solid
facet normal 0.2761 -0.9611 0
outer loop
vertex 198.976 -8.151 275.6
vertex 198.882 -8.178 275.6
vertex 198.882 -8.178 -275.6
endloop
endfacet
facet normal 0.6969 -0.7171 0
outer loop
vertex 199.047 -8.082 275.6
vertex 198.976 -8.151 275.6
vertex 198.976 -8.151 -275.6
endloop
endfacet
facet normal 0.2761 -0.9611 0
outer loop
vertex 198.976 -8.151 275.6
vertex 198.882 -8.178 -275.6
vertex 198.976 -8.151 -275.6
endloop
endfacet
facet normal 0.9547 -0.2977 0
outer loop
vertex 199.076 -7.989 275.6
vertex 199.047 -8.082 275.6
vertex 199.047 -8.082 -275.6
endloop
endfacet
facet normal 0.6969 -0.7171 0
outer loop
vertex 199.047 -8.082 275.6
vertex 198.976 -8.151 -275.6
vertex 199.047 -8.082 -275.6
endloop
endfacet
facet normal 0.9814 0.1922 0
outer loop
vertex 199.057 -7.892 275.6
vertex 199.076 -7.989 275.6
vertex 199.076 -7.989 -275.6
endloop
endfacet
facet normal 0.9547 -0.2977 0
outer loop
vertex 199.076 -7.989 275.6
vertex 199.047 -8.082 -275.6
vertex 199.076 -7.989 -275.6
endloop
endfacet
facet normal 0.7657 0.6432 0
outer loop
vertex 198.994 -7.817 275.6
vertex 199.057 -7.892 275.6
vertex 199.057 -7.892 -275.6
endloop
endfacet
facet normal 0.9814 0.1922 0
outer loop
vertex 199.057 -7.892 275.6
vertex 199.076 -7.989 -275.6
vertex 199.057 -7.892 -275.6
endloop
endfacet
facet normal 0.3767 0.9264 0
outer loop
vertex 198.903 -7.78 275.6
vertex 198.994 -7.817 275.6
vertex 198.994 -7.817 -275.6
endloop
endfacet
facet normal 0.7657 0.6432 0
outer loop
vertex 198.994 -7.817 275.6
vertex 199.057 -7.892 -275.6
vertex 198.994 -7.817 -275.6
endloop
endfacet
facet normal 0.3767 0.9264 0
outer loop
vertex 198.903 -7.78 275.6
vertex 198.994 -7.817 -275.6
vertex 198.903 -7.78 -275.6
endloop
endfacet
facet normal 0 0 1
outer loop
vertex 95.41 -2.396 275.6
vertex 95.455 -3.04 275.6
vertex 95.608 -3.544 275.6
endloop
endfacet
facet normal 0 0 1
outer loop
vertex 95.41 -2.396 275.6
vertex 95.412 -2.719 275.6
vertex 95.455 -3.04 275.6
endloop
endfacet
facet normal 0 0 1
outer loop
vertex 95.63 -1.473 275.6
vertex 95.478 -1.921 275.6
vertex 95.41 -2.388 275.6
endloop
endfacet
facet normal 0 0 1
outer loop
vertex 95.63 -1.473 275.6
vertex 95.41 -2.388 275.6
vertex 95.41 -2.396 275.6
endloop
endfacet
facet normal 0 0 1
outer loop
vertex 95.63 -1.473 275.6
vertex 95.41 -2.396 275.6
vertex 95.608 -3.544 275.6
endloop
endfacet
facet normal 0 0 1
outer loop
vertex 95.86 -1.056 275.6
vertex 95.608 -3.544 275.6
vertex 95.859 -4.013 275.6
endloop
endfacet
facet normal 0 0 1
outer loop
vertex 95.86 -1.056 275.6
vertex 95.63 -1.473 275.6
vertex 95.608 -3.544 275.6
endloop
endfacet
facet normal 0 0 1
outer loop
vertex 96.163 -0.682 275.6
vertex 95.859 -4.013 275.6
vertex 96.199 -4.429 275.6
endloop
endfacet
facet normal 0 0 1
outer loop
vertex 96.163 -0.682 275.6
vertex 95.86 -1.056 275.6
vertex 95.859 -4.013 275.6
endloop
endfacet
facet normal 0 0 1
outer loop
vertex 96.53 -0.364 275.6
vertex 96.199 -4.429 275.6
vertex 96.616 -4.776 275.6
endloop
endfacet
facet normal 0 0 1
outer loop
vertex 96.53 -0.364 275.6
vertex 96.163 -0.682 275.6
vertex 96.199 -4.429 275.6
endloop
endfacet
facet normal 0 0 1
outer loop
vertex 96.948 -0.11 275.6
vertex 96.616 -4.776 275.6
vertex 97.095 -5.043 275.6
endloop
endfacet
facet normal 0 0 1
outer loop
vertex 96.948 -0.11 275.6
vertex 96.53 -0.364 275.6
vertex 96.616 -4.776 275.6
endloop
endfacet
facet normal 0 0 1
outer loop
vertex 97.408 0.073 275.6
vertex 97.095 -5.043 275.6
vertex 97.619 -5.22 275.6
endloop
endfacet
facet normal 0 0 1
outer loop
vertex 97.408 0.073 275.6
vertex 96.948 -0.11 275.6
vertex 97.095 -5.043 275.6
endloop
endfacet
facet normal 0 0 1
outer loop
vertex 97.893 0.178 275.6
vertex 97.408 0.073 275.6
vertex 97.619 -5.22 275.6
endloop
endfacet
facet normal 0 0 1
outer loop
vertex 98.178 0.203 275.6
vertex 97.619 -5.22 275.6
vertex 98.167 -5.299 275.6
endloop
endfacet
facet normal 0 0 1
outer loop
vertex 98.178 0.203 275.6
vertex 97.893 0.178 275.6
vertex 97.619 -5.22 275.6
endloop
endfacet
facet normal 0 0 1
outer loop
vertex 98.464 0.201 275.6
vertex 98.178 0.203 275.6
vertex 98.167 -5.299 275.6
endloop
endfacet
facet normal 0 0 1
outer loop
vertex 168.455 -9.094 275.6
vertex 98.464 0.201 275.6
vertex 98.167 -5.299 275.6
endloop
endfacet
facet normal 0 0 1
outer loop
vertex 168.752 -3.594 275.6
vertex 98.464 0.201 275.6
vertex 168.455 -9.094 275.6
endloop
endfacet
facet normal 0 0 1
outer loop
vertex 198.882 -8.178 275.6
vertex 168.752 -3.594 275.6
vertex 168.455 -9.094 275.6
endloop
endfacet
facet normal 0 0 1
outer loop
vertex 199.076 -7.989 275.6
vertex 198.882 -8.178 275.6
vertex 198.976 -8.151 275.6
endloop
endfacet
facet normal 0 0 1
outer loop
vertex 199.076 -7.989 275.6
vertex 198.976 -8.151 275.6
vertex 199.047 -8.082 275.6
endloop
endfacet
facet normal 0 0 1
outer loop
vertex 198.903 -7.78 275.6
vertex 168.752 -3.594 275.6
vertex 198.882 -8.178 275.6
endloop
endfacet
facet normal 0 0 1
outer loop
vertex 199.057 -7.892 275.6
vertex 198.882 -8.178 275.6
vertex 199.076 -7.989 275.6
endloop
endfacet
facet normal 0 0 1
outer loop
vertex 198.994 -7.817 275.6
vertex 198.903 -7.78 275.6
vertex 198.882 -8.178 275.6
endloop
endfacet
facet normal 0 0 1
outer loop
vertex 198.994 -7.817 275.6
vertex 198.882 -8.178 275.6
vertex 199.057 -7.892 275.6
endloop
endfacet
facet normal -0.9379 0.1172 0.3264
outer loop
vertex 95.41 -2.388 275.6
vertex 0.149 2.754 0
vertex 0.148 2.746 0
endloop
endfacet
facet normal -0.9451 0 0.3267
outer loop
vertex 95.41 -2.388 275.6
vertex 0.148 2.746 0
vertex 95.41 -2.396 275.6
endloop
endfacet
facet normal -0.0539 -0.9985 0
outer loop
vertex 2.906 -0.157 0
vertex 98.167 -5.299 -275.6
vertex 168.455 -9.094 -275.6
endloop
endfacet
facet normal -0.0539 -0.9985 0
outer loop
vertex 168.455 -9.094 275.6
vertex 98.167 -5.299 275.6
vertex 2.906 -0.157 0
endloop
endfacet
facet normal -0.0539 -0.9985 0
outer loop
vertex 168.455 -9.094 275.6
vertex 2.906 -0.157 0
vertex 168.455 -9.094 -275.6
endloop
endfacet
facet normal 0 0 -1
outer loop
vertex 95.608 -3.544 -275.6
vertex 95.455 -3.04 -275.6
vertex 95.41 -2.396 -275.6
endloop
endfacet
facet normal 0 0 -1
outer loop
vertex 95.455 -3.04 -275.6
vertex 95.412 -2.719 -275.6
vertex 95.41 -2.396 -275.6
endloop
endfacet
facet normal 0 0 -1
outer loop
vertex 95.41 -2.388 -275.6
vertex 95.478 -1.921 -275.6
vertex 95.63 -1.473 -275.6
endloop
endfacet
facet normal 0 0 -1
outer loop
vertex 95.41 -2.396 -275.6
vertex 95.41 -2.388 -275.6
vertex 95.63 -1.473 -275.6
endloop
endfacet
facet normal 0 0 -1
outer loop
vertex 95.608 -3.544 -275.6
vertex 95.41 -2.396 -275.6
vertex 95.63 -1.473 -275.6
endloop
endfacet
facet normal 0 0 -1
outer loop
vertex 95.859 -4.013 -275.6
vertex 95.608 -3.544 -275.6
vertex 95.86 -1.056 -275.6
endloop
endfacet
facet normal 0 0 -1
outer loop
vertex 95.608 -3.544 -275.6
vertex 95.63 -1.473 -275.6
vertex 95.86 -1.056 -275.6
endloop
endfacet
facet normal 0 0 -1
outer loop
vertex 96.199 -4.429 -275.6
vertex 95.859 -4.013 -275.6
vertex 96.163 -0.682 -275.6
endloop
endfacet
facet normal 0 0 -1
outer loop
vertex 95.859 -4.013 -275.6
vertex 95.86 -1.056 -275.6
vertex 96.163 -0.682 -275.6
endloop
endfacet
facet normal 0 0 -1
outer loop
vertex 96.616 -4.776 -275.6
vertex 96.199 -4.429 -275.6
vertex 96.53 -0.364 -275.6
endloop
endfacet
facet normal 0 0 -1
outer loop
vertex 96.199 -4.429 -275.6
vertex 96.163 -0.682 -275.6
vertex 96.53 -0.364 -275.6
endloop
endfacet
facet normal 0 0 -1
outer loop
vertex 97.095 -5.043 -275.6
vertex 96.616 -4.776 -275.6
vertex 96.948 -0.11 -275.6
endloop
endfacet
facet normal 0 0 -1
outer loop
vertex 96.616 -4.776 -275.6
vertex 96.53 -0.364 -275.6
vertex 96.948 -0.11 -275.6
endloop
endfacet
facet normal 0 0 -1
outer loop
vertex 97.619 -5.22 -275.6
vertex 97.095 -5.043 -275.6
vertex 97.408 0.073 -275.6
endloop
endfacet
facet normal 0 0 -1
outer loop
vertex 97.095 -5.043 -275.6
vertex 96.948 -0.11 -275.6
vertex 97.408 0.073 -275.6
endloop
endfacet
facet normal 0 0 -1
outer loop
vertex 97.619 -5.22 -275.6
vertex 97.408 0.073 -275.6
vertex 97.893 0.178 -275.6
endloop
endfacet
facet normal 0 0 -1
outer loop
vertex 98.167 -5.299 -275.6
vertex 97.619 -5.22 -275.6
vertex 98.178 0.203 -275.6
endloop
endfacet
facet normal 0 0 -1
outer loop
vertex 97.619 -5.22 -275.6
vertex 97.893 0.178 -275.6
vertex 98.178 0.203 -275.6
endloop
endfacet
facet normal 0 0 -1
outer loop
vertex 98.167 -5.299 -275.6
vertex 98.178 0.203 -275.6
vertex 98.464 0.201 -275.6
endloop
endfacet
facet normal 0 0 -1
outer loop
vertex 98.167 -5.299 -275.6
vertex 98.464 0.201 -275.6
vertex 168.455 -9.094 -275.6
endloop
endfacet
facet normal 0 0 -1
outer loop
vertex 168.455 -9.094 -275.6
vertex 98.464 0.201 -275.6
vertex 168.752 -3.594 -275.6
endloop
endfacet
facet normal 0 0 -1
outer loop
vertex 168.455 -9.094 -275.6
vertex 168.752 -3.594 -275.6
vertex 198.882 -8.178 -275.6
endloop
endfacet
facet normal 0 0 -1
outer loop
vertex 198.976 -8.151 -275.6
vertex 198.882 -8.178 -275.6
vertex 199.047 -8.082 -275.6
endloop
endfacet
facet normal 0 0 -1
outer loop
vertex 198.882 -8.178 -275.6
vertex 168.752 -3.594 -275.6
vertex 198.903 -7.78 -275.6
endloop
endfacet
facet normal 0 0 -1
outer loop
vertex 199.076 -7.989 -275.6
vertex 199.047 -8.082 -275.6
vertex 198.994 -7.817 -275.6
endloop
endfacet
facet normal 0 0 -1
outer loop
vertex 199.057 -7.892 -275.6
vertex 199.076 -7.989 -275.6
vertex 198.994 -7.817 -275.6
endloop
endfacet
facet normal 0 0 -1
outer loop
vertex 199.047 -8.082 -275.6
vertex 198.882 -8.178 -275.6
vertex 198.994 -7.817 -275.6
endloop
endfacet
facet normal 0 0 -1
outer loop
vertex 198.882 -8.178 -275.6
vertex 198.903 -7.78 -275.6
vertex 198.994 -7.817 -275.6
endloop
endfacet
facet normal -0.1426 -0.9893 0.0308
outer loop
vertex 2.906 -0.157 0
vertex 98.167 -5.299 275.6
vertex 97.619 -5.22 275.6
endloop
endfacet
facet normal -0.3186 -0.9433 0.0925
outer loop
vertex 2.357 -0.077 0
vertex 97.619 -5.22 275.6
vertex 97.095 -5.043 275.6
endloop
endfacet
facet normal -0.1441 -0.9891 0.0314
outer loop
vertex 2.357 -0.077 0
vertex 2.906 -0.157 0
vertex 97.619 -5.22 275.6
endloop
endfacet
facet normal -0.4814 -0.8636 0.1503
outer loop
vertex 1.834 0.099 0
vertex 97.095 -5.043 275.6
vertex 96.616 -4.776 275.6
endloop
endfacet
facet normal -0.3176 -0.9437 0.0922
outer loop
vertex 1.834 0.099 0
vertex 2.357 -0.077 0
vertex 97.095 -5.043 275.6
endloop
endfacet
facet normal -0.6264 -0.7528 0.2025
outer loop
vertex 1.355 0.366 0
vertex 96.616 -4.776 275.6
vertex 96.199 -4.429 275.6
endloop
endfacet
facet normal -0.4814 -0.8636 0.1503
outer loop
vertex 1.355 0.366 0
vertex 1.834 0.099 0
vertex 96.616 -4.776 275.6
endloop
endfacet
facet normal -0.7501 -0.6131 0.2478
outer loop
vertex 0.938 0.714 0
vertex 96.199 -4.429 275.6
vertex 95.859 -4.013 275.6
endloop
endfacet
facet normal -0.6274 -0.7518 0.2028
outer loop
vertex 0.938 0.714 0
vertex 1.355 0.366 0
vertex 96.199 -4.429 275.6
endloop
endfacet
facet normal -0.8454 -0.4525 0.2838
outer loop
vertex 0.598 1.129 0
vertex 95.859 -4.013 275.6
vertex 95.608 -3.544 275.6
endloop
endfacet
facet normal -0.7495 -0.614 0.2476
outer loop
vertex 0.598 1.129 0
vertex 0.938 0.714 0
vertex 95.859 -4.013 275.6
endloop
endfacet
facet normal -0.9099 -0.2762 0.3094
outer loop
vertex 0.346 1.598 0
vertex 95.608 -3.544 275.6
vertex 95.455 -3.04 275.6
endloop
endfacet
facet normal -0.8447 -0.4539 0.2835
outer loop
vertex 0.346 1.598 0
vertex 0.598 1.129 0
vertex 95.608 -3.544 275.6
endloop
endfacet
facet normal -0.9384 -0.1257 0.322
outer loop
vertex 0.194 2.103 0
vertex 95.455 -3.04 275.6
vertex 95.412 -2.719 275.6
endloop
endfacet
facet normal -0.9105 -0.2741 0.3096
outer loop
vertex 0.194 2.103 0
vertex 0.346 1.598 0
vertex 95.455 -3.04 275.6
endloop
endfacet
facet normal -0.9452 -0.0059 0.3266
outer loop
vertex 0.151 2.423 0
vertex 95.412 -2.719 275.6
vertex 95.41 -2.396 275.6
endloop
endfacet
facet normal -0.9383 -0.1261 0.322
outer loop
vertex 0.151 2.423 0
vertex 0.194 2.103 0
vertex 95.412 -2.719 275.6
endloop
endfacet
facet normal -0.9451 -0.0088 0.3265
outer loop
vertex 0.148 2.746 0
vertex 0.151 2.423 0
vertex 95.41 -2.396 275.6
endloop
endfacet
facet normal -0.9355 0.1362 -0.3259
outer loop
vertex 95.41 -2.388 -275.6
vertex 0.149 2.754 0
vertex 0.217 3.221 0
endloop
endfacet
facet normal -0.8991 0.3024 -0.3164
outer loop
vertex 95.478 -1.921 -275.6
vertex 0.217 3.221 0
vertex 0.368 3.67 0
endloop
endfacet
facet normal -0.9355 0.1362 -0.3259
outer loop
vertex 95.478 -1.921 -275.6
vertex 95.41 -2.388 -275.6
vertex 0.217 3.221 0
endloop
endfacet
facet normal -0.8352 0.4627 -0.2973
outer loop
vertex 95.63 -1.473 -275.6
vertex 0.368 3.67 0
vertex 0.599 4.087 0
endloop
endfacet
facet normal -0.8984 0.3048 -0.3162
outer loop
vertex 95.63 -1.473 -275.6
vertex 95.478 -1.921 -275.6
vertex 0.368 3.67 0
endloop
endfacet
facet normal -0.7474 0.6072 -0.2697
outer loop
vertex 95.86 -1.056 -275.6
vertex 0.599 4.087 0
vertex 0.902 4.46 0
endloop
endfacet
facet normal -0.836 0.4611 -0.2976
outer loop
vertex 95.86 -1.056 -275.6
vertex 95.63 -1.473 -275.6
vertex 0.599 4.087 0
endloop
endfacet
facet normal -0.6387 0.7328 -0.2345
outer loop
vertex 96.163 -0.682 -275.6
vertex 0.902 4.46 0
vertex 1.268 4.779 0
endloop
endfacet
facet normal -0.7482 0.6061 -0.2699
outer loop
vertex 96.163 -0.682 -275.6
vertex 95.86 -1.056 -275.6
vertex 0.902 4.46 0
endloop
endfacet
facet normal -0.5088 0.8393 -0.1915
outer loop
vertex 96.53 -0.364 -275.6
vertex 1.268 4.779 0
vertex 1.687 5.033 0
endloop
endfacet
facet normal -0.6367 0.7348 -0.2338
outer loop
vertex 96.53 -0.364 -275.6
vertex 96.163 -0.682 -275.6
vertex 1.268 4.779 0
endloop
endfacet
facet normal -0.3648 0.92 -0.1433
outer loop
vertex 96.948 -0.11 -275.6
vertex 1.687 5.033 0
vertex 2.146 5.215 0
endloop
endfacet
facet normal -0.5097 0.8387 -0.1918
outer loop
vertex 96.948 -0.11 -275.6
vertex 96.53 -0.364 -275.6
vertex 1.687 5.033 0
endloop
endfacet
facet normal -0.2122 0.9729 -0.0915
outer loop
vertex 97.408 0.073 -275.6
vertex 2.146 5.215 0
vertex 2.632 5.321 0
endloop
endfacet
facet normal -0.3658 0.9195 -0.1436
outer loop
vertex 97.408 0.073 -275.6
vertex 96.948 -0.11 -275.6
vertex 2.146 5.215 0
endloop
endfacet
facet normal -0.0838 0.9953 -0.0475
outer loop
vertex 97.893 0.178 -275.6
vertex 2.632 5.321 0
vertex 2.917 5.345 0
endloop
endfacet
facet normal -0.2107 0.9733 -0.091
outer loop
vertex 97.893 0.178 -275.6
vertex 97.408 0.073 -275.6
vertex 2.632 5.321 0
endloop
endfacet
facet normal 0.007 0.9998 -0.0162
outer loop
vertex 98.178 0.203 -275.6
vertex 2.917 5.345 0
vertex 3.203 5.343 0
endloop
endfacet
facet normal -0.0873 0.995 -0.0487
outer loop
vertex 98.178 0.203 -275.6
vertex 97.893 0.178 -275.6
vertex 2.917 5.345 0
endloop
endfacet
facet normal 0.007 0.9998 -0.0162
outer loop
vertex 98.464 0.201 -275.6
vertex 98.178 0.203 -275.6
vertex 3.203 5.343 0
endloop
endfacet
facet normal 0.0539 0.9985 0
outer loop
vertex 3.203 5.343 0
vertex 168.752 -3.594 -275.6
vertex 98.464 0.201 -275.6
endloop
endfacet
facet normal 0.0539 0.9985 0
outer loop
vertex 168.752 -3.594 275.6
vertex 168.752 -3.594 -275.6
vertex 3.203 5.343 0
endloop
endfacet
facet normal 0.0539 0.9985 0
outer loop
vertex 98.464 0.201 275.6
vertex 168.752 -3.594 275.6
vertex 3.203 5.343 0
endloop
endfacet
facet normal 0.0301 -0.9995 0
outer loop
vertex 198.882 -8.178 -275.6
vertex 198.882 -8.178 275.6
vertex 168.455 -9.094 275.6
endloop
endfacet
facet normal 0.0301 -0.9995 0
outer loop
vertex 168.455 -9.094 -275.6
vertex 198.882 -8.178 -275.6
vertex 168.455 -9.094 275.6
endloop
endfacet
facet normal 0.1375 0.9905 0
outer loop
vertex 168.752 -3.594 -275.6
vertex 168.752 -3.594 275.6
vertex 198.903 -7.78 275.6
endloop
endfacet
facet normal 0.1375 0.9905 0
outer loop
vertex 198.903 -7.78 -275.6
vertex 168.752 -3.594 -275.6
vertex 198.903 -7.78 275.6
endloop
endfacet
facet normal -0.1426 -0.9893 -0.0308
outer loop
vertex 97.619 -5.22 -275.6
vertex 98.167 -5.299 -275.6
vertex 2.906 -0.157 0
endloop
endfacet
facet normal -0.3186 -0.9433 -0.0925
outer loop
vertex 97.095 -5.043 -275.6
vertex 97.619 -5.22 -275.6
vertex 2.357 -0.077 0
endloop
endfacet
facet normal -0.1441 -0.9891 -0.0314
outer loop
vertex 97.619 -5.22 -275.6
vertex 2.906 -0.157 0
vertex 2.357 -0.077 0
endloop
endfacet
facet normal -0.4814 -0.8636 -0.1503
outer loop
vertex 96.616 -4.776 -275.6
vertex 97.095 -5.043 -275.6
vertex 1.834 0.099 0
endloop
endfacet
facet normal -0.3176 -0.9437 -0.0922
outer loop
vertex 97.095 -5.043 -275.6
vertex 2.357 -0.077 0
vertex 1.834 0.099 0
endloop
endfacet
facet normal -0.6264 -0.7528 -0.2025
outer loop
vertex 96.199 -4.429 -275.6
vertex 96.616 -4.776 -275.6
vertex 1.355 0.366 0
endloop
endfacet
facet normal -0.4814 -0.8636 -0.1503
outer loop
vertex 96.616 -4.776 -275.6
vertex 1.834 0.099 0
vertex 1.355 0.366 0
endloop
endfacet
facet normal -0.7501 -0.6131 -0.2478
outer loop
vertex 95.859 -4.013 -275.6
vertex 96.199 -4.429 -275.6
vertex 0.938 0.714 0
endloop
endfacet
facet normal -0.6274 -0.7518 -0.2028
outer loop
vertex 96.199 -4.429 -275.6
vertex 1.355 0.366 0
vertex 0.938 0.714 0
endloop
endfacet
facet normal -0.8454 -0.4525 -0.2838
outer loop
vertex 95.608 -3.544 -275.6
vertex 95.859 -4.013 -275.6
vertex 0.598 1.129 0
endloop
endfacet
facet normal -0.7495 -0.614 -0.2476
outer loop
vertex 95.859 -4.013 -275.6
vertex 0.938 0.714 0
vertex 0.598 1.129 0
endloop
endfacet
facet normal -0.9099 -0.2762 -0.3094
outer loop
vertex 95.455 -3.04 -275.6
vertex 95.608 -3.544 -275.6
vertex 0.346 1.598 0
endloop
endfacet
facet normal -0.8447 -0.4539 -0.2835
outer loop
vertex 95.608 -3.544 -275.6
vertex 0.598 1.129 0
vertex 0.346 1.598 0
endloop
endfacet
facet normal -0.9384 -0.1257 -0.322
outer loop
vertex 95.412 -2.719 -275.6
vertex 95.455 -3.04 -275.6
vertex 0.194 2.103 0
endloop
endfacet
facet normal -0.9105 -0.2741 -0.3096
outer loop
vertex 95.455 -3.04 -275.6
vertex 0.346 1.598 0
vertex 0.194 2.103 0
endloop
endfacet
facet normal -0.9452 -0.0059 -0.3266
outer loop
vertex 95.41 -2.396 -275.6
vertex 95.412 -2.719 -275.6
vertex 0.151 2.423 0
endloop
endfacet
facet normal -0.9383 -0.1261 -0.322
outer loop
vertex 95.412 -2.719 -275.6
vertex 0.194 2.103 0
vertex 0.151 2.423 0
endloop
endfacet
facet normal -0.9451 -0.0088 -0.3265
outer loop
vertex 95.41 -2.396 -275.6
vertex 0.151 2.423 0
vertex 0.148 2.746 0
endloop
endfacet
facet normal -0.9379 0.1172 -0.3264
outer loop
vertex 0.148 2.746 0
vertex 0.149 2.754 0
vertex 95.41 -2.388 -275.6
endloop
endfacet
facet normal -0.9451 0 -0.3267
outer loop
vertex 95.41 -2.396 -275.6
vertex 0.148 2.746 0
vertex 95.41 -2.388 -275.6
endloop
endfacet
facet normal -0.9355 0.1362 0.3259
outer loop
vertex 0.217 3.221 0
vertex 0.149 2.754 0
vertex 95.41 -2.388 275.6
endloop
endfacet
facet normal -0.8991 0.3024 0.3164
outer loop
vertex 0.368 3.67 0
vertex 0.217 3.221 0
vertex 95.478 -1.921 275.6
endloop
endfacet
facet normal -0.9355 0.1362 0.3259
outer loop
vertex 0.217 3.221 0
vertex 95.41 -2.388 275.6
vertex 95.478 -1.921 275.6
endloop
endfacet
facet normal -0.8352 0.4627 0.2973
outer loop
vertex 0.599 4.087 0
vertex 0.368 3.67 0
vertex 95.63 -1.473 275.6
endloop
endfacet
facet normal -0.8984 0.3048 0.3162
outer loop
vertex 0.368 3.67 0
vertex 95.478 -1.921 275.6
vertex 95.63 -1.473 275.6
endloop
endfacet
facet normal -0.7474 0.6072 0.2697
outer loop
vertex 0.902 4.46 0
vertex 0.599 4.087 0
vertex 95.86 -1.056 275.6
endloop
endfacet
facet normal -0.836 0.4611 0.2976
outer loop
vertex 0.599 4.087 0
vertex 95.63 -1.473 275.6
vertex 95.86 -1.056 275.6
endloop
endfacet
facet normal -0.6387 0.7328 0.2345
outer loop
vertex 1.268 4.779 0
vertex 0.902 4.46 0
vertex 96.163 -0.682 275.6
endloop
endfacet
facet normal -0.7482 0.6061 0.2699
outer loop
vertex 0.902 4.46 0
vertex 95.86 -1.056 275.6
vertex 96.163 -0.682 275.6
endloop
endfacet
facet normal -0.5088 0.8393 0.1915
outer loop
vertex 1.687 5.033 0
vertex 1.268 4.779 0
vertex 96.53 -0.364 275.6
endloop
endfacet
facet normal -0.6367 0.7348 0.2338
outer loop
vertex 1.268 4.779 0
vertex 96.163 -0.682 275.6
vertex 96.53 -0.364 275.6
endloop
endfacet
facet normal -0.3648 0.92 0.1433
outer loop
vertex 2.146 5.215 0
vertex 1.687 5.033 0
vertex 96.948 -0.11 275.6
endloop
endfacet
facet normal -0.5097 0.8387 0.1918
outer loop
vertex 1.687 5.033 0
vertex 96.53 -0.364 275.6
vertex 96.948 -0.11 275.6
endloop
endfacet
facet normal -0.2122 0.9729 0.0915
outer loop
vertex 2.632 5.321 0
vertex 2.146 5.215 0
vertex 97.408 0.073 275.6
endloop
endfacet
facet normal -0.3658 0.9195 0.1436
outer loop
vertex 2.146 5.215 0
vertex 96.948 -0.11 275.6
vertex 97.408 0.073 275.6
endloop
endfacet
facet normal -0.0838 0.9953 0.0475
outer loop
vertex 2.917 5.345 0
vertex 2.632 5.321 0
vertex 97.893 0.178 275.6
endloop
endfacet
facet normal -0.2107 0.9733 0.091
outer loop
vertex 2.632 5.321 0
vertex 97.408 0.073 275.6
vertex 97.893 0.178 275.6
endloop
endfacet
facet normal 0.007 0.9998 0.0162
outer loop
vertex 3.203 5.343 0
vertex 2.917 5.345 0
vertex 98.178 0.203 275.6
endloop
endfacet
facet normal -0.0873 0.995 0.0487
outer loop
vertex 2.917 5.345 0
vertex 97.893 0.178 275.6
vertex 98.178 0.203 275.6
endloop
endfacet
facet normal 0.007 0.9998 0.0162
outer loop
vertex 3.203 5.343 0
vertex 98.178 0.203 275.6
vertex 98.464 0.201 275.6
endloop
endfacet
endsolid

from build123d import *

# Parameters (mm, degrees)
BOSS_EXTRUDE1_DEPTH = 275.6
CUT_EXTRUDE1_DEPTH  = 342.565498998
CUT_EXTRUDE2_DEPTH  = 342.565498998
CUT_EXTRUDE3_DEPTH  = 587.943701099
CUT_EXTRUDE4_DEPTH  = 587.892777338
FILLET1_R           = 2.75
FILLET2_R           = 0.2


with BuildPart() as part:
    # Sketch1 → Boss-Extrude1 (new, symmetric)
    with BuildSketch(Plane.XY):
        Polygon((0, 0), (201.107183261, -10.856373276), (201.404089876, -5.356373276), (0.296906615, 5.5), align=None)
    extrude(amount=BOSS_EXTRUDE1_DEPTH, both=True)

    # Sketch2 → Cut-Extrude1 (cut, through all)
    with BuildSketch(Plane(origin=(0.296906615, 5.5, 0), x_dir=(0.9985460936510022, -0.053904534636001866, 0), z_dir=(0.053904534636001866, 0.9985460936510022, 0))):
        Polygon((0, 0), (95.4, 275.6), (0, 275.6), align=None)
    extrude(amount=-CUT_EXTRUDE1_DEPTH, mode=Mode.SUBTRACT)

    # Sketch3 → Cut-Extrude2 (cut, through all)
    with BuildSketch(Plane(origin=(0.296906615, 5.5, 0), x_dir=(0.9985460936510022, -0.053904534636001866, 0), z_dir=(0.053904534636001866, 0.9985460936510022, 0))):
        Polygon((0, 0), (95.4, -275.6), (0, -275.6), align=None)
    extrude(amount=-CUT_EXTRUDE2_DEPTH, mode=Mode.SUBTRACT)

    # Sketch4 → Cut-Extrude3 (cut, through all)
    with BuildSketch(Plane.XY.offset(275.6)):
        Polygon((168.751632614, -3.593694993), (201.255636569, -8.106373276), (201.404089876, -5.356373276), align=None)
    extrude(amount=-CUT_EXTRUDE3_DEPTH, mode=Mode.SUBTRACT)

    # Sketch5 → Cut-Extrude4 (cut, through all)
    with BuildSketch(Plane.XY.offset(275.6)):
        Polygon((201.255636569, -8.106373276), (168.454725999, -9.093694993), (201.107183261, -10.856373276), align=None)
    extrude(amount=-CUT_EXTRUDE4_DEPTH, mode=Mode.SUBTRACT)

    # Fillet1
    fillet1_edges = [part.edges().sort_by_distance(p)[0] for p in [
        (47.630648667, -2.571246302, -137.8),
        (47.927555282, 2.928753698, -137.8),
        (47.630648667, -2.571246302, 137.8),
        (47.927555282, 2.928753698, 137.8),
    ]]
    fillet(fillet1_edges, radius=FILLET1_R)

    # Fillet2
    fillet2_edges = [part.edges().sort_by_distance(p)[0] for p in [
        (201.255636569, -8.106373276, 0),
    ]]
    fillet(fillet2_edges, radius=FILLET2_R)


solid = part.part
